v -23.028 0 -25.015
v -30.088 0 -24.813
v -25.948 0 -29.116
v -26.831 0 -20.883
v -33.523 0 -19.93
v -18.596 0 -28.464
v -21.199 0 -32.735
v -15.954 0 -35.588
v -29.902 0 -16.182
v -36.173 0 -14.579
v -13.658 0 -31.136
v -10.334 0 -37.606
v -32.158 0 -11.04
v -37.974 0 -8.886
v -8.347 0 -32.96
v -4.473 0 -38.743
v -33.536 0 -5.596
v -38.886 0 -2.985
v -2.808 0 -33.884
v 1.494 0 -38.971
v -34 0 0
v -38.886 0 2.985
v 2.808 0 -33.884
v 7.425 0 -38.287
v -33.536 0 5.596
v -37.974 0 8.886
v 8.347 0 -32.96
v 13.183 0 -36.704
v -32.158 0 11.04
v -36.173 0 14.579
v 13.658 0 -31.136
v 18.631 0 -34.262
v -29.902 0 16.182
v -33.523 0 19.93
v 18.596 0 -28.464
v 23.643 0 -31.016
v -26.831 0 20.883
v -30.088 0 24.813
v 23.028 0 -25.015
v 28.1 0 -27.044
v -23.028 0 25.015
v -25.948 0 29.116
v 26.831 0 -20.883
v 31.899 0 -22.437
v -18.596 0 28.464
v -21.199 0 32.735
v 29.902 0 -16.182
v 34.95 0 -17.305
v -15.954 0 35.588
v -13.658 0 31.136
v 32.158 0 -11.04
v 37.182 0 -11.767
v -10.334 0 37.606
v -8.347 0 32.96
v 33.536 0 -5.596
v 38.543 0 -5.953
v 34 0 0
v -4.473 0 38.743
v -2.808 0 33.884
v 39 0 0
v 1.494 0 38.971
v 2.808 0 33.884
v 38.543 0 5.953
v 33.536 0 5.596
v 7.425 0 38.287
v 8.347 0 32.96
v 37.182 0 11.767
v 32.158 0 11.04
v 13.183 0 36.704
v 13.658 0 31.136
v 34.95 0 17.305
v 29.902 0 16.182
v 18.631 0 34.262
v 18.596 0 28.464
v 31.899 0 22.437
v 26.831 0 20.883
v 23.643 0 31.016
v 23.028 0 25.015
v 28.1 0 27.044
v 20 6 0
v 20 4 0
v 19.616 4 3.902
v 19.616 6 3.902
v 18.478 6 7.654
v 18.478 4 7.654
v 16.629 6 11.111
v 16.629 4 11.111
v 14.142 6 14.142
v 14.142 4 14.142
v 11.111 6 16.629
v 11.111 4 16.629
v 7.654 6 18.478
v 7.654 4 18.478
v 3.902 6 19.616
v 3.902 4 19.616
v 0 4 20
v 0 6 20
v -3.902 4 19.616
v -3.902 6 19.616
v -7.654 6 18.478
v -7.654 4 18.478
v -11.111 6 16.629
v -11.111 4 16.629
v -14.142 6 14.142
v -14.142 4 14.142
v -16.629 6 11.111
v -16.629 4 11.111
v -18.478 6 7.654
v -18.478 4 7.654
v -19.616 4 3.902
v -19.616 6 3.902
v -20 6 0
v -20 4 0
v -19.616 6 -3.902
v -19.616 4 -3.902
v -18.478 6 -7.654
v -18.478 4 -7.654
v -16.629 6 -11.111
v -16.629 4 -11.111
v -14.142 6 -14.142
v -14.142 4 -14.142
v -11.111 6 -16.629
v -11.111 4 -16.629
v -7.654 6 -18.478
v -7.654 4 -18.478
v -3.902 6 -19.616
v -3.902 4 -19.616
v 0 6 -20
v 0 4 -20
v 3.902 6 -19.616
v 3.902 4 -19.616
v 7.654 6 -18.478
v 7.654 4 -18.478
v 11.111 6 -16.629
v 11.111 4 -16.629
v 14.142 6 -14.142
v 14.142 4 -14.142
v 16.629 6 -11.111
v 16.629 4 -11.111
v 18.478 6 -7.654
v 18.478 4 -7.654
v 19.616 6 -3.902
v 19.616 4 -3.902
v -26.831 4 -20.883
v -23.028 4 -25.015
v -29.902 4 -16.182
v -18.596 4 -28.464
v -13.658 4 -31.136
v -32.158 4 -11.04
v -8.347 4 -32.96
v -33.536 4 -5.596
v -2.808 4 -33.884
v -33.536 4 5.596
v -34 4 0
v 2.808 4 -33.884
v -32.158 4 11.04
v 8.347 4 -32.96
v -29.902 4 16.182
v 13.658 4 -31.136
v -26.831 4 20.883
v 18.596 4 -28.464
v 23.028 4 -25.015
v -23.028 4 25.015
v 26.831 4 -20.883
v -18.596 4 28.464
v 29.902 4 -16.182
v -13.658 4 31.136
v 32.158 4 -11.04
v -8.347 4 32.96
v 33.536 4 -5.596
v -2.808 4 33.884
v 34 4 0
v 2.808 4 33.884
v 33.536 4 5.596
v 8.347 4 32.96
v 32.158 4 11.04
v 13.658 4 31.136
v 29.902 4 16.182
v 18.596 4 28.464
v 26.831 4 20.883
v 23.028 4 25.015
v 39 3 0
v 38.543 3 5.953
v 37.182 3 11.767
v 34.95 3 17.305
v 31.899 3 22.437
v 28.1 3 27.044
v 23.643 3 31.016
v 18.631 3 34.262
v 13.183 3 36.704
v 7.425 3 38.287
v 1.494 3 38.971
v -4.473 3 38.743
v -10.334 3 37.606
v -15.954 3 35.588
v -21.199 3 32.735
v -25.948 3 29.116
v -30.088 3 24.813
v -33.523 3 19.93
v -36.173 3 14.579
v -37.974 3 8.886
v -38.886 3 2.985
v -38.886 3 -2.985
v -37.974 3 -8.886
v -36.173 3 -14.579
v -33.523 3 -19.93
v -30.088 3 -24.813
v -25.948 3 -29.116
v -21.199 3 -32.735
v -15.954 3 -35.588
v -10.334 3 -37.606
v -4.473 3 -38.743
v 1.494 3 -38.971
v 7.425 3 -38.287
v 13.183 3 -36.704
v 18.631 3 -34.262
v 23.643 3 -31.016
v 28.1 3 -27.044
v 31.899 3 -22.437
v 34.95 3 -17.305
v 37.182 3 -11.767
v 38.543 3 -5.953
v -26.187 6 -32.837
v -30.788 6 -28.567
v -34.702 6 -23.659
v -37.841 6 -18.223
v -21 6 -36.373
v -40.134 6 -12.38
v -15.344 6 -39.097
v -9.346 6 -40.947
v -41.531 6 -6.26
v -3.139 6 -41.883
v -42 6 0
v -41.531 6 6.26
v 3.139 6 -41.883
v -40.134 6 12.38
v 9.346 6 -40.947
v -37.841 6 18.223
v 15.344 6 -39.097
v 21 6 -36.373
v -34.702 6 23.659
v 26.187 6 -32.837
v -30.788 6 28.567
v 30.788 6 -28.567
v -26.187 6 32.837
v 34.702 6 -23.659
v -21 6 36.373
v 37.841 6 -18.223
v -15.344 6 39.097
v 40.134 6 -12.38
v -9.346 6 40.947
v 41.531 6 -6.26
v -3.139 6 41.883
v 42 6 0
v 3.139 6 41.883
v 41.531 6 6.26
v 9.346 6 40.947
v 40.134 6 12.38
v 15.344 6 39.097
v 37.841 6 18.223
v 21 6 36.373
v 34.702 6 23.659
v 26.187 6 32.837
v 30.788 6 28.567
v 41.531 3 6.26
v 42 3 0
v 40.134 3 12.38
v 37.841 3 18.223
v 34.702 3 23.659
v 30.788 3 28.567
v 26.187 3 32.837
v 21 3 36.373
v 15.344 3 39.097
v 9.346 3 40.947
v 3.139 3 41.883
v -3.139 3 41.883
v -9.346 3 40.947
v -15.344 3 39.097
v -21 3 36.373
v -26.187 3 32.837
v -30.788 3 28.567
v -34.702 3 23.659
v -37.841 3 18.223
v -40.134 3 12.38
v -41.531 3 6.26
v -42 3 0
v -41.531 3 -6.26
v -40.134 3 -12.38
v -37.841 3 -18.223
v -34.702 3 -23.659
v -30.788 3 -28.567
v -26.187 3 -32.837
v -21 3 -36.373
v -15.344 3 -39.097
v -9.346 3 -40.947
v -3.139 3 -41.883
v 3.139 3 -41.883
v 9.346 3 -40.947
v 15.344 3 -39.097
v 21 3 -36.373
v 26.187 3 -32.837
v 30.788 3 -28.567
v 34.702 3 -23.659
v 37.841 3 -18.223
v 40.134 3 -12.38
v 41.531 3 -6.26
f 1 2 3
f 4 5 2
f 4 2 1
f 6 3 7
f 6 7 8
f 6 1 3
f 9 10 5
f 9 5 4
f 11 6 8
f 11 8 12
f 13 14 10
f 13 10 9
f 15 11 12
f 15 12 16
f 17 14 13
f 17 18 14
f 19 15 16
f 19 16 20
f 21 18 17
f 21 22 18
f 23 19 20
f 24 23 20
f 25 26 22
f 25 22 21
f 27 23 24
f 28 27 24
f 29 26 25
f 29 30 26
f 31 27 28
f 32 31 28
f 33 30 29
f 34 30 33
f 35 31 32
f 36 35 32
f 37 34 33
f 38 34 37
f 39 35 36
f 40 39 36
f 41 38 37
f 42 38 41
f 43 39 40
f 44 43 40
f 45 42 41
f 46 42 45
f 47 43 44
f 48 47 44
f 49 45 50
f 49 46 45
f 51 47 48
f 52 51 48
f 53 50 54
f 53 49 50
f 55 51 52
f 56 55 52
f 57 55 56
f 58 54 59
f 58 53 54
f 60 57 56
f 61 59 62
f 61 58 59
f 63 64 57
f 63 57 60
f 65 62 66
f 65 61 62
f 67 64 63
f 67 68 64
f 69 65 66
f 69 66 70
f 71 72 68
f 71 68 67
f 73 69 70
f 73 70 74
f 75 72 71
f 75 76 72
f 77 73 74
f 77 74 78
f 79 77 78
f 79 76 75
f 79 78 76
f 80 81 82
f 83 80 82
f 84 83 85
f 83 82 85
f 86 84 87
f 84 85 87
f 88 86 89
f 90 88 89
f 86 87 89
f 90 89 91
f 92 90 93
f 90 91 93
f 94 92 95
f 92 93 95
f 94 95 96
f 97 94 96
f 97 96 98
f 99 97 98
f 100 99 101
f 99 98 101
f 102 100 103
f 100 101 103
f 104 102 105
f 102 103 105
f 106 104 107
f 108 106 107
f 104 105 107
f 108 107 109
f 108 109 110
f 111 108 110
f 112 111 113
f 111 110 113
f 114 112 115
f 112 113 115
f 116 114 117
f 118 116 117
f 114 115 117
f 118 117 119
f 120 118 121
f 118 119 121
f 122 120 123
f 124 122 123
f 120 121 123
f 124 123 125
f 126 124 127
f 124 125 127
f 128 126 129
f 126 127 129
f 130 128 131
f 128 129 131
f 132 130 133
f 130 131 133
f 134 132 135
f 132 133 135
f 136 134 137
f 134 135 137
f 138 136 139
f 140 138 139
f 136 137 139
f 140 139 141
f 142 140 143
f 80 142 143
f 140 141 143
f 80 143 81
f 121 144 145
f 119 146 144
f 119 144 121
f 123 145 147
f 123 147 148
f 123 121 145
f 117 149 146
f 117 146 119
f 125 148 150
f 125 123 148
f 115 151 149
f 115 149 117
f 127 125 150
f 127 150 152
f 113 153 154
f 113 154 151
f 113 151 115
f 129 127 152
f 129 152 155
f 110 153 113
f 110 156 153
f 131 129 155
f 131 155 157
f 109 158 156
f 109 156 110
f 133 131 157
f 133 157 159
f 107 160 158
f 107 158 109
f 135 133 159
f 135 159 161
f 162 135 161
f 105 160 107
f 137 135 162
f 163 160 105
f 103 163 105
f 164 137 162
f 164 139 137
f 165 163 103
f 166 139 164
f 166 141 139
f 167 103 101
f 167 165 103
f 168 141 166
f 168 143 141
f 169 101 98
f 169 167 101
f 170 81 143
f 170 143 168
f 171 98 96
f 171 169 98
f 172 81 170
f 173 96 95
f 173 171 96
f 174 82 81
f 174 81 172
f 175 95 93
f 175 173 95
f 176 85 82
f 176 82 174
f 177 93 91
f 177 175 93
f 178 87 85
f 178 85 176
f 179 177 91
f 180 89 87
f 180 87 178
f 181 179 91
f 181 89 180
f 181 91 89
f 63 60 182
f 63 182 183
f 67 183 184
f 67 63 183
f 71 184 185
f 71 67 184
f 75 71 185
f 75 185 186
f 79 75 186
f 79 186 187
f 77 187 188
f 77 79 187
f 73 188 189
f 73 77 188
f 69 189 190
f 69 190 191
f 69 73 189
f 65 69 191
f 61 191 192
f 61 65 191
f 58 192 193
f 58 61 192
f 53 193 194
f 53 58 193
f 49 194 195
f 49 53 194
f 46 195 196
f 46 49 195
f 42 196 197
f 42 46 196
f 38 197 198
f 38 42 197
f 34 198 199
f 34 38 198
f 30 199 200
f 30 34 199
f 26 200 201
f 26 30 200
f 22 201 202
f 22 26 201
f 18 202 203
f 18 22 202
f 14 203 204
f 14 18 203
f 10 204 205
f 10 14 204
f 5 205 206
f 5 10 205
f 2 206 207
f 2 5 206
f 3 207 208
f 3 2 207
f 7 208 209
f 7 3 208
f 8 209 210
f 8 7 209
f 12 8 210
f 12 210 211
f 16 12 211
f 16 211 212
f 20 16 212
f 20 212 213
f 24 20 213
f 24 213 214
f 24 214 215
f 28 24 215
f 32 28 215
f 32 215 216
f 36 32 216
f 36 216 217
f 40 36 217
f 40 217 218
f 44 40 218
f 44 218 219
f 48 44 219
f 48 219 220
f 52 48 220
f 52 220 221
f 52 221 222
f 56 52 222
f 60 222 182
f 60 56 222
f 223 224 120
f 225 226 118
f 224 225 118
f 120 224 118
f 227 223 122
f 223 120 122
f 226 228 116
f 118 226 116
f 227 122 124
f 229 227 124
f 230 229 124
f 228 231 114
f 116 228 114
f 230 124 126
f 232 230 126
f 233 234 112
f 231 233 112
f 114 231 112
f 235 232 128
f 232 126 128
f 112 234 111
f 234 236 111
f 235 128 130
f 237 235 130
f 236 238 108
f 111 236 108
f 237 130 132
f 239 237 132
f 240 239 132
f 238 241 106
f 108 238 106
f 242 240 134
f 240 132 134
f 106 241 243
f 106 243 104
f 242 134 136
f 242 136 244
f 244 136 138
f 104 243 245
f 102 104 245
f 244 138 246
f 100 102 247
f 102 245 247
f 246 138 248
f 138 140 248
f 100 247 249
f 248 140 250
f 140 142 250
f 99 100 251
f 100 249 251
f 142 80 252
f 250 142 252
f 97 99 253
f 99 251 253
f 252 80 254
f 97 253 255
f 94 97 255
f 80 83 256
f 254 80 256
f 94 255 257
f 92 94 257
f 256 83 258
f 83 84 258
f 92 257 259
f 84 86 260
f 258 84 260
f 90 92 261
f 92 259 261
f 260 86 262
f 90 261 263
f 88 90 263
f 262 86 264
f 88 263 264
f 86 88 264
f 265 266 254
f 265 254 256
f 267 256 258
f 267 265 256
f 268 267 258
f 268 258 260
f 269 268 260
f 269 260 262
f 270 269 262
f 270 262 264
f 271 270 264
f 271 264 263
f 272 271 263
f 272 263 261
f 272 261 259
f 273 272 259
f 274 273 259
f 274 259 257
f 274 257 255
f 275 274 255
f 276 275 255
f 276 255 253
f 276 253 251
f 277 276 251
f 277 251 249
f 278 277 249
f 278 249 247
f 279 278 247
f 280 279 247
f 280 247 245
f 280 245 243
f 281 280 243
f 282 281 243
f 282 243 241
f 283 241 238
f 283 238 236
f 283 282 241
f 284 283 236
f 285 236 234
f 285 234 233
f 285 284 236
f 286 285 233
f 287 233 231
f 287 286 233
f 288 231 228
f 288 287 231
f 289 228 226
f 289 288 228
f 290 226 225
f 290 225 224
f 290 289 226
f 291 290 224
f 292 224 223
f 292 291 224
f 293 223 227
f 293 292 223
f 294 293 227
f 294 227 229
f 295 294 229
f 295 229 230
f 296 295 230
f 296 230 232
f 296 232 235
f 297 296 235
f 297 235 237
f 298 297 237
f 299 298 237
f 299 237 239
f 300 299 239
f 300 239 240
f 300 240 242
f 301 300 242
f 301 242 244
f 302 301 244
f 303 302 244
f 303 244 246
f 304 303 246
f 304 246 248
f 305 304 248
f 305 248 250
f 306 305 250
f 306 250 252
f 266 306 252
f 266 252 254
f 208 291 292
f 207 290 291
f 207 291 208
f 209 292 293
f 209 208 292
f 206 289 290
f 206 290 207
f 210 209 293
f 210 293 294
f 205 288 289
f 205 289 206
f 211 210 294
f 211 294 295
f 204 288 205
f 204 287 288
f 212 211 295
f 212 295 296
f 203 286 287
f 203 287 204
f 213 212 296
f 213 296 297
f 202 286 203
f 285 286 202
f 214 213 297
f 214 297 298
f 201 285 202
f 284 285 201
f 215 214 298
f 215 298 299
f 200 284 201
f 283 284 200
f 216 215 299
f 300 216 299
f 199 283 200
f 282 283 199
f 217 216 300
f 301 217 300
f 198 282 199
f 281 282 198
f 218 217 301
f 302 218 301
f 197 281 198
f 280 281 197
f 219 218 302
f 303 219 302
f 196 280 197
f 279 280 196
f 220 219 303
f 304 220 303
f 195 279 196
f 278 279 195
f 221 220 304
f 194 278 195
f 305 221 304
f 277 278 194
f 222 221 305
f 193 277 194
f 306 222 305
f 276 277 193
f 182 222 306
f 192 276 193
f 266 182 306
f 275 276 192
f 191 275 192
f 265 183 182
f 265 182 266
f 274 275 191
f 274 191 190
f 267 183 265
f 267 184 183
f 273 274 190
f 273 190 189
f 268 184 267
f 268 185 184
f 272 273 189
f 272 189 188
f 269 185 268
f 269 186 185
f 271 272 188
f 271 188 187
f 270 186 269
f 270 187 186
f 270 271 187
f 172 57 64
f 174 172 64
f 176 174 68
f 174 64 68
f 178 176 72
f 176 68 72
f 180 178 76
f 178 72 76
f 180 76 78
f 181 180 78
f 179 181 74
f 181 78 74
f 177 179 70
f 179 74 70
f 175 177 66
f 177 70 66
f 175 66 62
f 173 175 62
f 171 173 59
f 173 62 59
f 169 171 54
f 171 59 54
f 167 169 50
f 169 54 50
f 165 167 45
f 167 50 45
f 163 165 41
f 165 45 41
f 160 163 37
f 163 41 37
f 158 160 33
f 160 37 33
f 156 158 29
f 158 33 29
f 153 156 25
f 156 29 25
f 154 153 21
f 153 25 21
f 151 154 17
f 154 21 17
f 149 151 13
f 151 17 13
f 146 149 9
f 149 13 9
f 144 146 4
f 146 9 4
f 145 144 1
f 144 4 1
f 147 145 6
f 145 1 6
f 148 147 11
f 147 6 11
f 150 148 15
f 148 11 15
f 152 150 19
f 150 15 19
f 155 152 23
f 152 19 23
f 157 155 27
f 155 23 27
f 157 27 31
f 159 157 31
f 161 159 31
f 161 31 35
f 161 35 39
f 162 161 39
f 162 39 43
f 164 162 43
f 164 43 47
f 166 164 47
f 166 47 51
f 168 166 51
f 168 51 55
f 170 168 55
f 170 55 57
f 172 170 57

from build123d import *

# Parameters (mm, degrees)
F0_R     = 42
F1_DEPTH = 6
F2_R     = 34
F3_DEPTH = 4
F4_R     = 20
F5_DEPTH = 2
F6_R     = 42
F6_R_2   = 39
F7_DEPTH = 3


with BuildPart() as f1:
    # F0 (on Front) → F1 (new body)
    with BuildSketch(Plane.XZ):
        Circle(F0_R)
    extrude(amount=-F1_DEPTH)

    # F2 (on face) → F3 (cut)
    with BuildSketch(Plane.XZ):
        Circle(F2_R)
    extrude(amount=-F3_DEPTH, mode=Mode.SUBTRACT)

    # F4 (on face) → F5 (cut)
    with BuildSketch(Plane.XZ.offset(-4)):
        Circle(F4_R)
    extrude(amount=-F5_DEPTH, mode=Mode.SUBTRACT)

    # F6 (on face) → F7 (cut)
    with BuildSketch(Plane.XZ):
        Circle(F6_R)
        Circle(F6_R_2, mode=Mode.SUBTRACT)
    extrude(amount=-F7_DEPTH, mode=Mode.SUBTRACT)


solid = f1.part
